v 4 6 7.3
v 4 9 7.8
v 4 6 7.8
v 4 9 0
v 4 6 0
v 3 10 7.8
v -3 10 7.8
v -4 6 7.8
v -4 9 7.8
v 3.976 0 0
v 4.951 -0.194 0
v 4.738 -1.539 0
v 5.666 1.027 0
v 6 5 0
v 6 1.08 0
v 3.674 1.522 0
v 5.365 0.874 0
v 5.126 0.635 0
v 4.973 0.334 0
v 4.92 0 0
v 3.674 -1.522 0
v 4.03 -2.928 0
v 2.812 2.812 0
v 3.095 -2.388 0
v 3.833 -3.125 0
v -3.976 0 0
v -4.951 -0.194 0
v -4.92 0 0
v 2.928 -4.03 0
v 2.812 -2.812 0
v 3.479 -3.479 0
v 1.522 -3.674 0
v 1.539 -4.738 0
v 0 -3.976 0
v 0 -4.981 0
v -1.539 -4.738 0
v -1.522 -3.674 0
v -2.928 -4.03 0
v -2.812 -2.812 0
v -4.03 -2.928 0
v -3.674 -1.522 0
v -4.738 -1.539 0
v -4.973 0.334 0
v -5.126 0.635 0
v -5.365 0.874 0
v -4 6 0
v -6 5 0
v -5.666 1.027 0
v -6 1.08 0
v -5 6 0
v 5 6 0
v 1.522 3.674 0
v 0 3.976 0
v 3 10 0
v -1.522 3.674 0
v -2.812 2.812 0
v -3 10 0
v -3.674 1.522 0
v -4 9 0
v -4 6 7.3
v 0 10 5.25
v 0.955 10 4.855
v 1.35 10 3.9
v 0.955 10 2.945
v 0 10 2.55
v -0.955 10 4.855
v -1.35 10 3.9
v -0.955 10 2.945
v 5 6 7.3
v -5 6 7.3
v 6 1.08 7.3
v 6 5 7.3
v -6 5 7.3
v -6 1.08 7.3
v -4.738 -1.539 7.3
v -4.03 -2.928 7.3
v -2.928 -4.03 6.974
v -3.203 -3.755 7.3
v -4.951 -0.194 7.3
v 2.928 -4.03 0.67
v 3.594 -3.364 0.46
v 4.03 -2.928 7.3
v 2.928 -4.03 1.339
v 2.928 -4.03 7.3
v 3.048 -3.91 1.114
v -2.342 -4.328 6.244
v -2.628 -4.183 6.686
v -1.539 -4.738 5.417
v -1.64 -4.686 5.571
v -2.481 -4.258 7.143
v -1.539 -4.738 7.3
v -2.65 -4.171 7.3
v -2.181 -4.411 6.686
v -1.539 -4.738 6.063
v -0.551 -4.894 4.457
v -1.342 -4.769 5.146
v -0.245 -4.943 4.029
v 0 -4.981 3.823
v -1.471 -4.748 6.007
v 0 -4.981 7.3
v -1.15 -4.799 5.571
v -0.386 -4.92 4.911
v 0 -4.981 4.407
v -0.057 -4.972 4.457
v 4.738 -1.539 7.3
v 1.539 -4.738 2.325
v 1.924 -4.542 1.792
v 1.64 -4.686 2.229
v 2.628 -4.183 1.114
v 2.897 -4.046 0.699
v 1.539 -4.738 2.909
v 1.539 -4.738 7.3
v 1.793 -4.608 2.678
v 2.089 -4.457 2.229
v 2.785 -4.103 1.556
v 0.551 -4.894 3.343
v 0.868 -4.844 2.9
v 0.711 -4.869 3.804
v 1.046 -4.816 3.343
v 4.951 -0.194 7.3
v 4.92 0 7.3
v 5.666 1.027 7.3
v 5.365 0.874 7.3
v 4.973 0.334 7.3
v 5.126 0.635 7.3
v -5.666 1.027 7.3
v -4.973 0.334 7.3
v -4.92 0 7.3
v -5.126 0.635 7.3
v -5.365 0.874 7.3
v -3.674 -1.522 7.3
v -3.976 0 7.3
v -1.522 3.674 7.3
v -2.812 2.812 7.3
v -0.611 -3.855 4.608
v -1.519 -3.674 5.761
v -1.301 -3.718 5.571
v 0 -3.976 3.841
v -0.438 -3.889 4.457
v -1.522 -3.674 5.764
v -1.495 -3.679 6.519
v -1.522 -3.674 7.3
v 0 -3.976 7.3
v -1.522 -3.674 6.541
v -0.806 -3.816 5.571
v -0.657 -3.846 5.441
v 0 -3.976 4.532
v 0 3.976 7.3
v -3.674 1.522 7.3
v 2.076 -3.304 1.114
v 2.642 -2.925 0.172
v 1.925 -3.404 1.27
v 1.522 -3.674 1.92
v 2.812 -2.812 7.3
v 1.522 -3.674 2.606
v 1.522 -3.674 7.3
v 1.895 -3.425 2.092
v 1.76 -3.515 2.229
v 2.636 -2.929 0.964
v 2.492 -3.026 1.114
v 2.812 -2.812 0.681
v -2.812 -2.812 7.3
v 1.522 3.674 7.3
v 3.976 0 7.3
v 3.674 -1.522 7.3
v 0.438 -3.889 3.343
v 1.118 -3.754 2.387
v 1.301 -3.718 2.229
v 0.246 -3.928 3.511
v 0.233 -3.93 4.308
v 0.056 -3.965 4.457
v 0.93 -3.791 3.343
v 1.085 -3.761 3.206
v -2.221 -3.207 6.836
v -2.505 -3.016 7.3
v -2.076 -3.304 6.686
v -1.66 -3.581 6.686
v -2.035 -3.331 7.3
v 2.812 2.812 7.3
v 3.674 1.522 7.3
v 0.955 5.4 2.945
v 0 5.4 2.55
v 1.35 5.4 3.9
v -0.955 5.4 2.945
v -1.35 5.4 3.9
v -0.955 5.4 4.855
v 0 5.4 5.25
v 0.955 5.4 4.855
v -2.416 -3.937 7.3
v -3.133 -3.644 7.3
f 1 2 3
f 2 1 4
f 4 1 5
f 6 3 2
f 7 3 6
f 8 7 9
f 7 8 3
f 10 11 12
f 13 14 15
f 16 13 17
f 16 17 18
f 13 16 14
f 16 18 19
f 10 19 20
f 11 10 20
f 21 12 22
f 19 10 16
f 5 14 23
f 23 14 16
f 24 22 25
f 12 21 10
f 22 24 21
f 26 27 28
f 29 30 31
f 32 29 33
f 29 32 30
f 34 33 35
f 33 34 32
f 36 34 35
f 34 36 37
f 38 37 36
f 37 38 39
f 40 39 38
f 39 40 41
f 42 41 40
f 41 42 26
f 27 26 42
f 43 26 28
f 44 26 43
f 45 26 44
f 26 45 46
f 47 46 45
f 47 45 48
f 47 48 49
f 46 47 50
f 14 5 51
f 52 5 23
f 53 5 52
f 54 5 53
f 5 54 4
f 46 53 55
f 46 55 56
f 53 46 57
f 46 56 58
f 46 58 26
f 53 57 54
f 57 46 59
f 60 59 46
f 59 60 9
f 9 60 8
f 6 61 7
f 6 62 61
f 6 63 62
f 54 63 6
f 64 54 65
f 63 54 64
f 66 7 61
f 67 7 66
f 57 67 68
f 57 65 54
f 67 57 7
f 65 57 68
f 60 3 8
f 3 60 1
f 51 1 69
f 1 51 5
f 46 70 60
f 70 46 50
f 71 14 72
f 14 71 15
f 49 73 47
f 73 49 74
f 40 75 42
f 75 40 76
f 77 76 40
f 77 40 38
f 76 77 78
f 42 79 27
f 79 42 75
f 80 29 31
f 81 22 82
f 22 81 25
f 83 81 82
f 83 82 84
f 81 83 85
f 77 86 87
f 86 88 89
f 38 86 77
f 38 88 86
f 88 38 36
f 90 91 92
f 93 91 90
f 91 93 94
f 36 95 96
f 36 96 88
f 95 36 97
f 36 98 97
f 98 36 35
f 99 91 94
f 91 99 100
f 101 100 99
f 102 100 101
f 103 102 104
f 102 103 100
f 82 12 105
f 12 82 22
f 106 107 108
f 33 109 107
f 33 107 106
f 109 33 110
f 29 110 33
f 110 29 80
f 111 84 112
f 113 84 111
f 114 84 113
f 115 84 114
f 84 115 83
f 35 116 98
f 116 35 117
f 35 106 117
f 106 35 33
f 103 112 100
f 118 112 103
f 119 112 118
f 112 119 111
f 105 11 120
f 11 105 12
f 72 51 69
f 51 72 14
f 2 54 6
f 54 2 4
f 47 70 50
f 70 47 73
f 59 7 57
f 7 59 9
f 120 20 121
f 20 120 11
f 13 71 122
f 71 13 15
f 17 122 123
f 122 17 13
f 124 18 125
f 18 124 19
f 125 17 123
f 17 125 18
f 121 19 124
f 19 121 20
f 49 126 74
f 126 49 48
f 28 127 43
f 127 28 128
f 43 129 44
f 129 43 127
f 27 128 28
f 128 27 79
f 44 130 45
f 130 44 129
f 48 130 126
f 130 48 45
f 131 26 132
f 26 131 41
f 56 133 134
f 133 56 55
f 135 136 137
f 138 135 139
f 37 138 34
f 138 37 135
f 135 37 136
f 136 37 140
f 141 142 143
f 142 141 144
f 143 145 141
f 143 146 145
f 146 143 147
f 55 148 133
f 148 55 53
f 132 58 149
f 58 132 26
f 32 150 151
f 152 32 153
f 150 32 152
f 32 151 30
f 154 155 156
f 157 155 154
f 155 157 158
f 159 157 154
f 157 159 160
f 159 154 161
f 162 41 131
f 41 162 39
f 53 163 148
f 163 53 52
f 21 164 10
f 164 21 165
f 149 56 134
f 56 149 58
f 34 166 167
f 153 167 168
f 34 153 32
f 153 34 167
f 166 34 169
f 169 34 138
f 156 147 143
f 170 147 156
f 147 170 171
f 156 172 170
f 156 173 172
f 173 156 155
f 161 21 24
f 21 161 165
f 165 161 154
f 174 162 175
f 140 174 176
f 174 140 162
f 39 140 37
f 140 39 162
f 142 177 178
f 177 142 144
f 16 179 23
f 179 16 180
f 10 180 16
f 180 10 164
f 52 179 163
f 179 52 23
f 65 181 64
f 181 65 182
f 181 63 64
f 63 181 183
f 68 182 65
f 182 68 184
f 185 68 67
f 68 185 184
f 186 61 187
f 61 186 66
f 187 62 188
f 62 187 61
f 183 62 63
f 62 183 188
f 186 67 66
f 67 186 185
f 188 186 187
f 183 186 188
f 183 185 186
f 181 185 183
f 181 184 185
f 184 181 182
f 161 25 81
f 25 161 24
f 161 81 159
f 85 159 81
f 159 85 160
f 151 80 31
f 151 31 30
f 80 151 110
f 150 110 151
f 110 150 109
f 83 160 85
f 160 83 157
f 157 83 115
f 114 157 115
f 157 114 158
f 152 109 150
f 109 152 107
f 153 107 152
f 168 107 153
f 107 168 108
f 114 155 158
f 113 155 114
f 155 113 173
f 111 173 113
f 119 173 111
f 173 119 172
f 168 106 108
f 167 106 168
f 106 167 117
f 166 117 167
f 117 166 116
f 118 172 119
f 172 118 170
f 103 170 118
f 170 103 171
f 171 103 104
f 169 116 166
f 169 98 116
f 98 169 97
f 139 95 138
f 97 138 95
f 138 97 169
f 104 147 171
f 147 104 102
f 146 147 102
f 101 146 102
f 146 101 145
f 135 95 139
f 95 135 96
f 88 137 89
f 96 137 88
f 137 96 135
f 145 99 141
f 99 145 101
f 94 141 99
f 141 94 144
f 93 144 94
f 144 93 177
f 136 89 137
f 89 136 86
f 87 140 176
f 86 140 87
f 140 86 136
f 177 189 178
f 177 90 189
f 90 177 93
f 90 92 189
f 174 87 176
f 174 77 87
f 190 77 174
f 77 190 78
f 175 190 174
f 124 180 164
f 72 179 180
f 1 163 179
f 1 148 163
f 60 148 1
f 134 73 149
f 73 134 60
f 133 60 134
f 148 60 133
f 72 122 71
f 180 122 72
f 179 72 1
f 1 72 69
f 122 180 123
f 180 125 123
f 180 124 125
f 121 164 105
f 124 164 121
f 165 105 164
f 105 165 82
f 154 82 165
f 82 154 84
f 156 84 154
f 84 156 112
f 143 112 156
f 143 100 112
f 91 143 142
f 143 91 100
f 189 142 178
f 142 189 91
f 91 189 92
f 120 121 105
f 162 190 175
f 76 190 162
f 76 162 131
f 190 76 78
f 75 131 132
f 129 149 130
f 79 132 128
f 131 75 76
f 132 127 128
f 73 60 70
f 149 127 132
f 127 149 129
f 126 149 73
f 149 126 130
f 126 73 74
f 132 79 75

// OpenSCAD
// file: parameters.scad
// Parameters file for RepRap Huxley

pi=3.14159265;

// The relative location in your file system where the .dxf files are
// DXFs are for quick development.  They should be replaced by parameterised CSG in dure course.

fileroot="DXF-files/";

rodsize = 6;	//threaded/smooth rod diameter in mm
xaxis = 182.5;	//width of base in mm
yaxis = 266.5;	//length of base in mm


screwsize = 3;	//bearing bore/screw diameter in mm
bearingsize = 10;	//outer diameter of bearings in mm
bearingwidth = 4;	//width of bearings in mm


rodpitch = rodsize / 6;
rodnutsize = 0.8 * rodsize; //4.8
rodwashersize = 0.2 * rodsize; //1.2
rodwasherdiameter = 2 * rodsize;//12
screwpitch = screwsize / 6;
nutsize = 0.8 * screwsize;
nutdiameter = 1.9 * screwsize;
washersize = 0.2 * screwsize;
washerdiameter = 2 * screwsize;
partthick = 2 * (rodsize+1); //12
vertexrodspace = 2 * rodsize; //12


c = [0.3, 0.3, 0.3];
rodendoffset = rodnutsize + rodwashersize * 2 + partthick / 2;//13.2
vertexoffset = vertexrodspace + rodendoffset;//25.2
//vertexoffset = 22;

renderrodthreads = false;
renderscrewthreads = false;
fn = 36;

// The gap between the joining rods at a vertex

vertex_radius=sqrt(rodsize*rodsize + vertexoffset*vertexoffset);
vertex_ang = atan(vertexoffset/rodsize)-30;
vertex_gap = 2*vertex_radius*cos(vertex_ang);

// Nema 14 dimensions - these are absolute

nema14_square=35.3;
nema14_screws=26;
nema14_screw_r=1.5;
nema14_hub=22;
nema14_hub_depth=2;
nema14_length=36;
nema14_shaft=5;
nema14_shaft_length=66;
nema14_shaft_projection=19;

// Nema 11 dimensions - these are absolute

nema11_square=28.5;
nema11_screws=23;
nema11_screw_r=1.25;
nema11_hub=22;
nema11_hub_depth=2;
nema11_length=44.5;
nema11_shaft=5;
nema11_shaft_length=78;
nema11_shaft_projection=18;

// Limit switch parameters

limit_switch_hole_diameter=2.5;
limit_switch_centres=9.5;

// The RepRap slide bearings

bearing_mount_centres=18;
bearing_width=7;

// X axis parameters - many should be relative

x_bar_gap=30;
motor_center_y = 26;
bar_clamp_x=5;
bar_clamp_y=8;
bar_clamp_x_gap=23;
bearing_y=50;
bearing_x=bar_clamp_x_gap + 10;
hole_land=4;
thickness=5;
bearing_low_z = 8;
bearing_z_gap = 25;
bearing_plate_width = bearing_mount_centres+2*hole_land + 10;
bearing_plate_overlap=0.5;
bearing_plate_support=10;
// file: configuration.scad
// eMAKEr Huxley
// Configuration file
// GNU GPL v3
// Jean-Marc Giacalone
// info@emakershop.com
// www.emakershop.com
// http://www.reprap.org/wiki/EMAKER_Huxley
// http://github.com/jmgiacalone/eMAKERHuxley

use <library.scad>

//Round corner diameter
round_corner_diameter = 8;

//Thin wall size
layer_height = 0.4;
perimeter_width_over_thicknes = 1.6;
infill_widht_over_thickness = 1.55;
thin_wall = 2*(perimeter_width_over_thicknes*layer_height+infill_widht_over_thickness*layer_height);
if(thin_wall<2){
	echo("Check thin wall size, its below 2mm!");
}
echo(thin_wall);

// MINI-HUXLEY VERSION (TODO, just place holder)
// include <configuration-huxley.scad>
m8_diameter=8.3;
m5_diameter=5.3;
m4_diameter=4.3;
m3_diameter=3.3;
m3_dia_clr=3.5;
m3_nut = 2.8;
m3_af = 5.8;
m6_diameter = 6;
m6_nut = 11.5;
bushing_diameter = 8;
motor_shaft=5.3;
bushing_rodsize = 6;
bushing_outerDiameter = 12;
bushing_lenght = 8;

// Some basic functions, probably should be somewhere else
// main file
include<configuration.scad>;
use<library.scad>

bushing_height=7.8;
socket_width=8;
socket_depth=4;
bushing_width=12;
bushing_rodsize=7.8;//6.2;
bearing_length=4;
body_chamfers=1;
rod_clearance=0;//dia
thickness=0.51;
flange=1;

side=0;

module ptfe_bushing(a=45,b=0,c=10)
{
//body
difference()
{
	//positive
	union()
	{
		translate([0,socket_depth/2+6,bushing_height/2]) cube([socket_width,socket_depth,bushing_height],center=true);
		translate([0,bushing_width/4,bushing_height/2]) cube([bushing_width,bushing_width/2,bushing_height],center=true);
		//cylinder(h=bushing_height,r=bushing_width/2);
		polyhole(bushing_height,bushing_rodsize+thickness*4);
	}
	//negative
	union()
	{
		//groove
		polyhole(bushing_height, bushing_rodsize+rod_clearance);
		//body chamfers
		for(j=[0,1])
		{
			mirror([j,0,0]) union()
			{
				translate([bushing_width/2,bushing_width/2,0]) rotate([0,0,45]) cube([body_chamfers*sqrt(2),body_chamfers*sqrt(2),bushing_height*2],center=true);
				translate([socket_width/2,bushing_width/2+socket_depth,0]) rotate([0,0,45]) cube([body_chamfers*sqrt(2),body_chamfers*sqrt(2),bushing_height*2],center=true);
			}
		}
		//screw hole
		translate([0,(bushing_rodsize+rod_clearance)/2+1.5,bushing_height/2]) rotate([-90,0,0])
			cylinder(h=socket_depth*1.6,r=2.7/2, $fn=8);
		//slot
		translate([0,0,0]) rotate([0,0,45])
			linear_extrude(height = bushing_height, convexity = 10, twist = 90)
			translate([0, -bushing_rodsize+thickness*8-2.1, 0])
			square(size=[0.5,2.2]);//circle(r = 4);
		//outer rads
		for(j=[0,1])
		{
			mirror([j,0,0]) union()
			{
		translate([bushing_width/2,0,0]) cylinder(h=bushing_height,r=(bushing_width-(bushing_rodsize+thickness*4))/2, $fn=20);
			}
		}
		//igus flange clearance
		translate([0,0,bushing_height])
			cube([16,12,flange], center=true);

	}
}
}//end module ptfe_bushing

if(side==1)
{
	ptfe_bushing(130,-90,0);
}else{
	ptfe_bushing();
}
